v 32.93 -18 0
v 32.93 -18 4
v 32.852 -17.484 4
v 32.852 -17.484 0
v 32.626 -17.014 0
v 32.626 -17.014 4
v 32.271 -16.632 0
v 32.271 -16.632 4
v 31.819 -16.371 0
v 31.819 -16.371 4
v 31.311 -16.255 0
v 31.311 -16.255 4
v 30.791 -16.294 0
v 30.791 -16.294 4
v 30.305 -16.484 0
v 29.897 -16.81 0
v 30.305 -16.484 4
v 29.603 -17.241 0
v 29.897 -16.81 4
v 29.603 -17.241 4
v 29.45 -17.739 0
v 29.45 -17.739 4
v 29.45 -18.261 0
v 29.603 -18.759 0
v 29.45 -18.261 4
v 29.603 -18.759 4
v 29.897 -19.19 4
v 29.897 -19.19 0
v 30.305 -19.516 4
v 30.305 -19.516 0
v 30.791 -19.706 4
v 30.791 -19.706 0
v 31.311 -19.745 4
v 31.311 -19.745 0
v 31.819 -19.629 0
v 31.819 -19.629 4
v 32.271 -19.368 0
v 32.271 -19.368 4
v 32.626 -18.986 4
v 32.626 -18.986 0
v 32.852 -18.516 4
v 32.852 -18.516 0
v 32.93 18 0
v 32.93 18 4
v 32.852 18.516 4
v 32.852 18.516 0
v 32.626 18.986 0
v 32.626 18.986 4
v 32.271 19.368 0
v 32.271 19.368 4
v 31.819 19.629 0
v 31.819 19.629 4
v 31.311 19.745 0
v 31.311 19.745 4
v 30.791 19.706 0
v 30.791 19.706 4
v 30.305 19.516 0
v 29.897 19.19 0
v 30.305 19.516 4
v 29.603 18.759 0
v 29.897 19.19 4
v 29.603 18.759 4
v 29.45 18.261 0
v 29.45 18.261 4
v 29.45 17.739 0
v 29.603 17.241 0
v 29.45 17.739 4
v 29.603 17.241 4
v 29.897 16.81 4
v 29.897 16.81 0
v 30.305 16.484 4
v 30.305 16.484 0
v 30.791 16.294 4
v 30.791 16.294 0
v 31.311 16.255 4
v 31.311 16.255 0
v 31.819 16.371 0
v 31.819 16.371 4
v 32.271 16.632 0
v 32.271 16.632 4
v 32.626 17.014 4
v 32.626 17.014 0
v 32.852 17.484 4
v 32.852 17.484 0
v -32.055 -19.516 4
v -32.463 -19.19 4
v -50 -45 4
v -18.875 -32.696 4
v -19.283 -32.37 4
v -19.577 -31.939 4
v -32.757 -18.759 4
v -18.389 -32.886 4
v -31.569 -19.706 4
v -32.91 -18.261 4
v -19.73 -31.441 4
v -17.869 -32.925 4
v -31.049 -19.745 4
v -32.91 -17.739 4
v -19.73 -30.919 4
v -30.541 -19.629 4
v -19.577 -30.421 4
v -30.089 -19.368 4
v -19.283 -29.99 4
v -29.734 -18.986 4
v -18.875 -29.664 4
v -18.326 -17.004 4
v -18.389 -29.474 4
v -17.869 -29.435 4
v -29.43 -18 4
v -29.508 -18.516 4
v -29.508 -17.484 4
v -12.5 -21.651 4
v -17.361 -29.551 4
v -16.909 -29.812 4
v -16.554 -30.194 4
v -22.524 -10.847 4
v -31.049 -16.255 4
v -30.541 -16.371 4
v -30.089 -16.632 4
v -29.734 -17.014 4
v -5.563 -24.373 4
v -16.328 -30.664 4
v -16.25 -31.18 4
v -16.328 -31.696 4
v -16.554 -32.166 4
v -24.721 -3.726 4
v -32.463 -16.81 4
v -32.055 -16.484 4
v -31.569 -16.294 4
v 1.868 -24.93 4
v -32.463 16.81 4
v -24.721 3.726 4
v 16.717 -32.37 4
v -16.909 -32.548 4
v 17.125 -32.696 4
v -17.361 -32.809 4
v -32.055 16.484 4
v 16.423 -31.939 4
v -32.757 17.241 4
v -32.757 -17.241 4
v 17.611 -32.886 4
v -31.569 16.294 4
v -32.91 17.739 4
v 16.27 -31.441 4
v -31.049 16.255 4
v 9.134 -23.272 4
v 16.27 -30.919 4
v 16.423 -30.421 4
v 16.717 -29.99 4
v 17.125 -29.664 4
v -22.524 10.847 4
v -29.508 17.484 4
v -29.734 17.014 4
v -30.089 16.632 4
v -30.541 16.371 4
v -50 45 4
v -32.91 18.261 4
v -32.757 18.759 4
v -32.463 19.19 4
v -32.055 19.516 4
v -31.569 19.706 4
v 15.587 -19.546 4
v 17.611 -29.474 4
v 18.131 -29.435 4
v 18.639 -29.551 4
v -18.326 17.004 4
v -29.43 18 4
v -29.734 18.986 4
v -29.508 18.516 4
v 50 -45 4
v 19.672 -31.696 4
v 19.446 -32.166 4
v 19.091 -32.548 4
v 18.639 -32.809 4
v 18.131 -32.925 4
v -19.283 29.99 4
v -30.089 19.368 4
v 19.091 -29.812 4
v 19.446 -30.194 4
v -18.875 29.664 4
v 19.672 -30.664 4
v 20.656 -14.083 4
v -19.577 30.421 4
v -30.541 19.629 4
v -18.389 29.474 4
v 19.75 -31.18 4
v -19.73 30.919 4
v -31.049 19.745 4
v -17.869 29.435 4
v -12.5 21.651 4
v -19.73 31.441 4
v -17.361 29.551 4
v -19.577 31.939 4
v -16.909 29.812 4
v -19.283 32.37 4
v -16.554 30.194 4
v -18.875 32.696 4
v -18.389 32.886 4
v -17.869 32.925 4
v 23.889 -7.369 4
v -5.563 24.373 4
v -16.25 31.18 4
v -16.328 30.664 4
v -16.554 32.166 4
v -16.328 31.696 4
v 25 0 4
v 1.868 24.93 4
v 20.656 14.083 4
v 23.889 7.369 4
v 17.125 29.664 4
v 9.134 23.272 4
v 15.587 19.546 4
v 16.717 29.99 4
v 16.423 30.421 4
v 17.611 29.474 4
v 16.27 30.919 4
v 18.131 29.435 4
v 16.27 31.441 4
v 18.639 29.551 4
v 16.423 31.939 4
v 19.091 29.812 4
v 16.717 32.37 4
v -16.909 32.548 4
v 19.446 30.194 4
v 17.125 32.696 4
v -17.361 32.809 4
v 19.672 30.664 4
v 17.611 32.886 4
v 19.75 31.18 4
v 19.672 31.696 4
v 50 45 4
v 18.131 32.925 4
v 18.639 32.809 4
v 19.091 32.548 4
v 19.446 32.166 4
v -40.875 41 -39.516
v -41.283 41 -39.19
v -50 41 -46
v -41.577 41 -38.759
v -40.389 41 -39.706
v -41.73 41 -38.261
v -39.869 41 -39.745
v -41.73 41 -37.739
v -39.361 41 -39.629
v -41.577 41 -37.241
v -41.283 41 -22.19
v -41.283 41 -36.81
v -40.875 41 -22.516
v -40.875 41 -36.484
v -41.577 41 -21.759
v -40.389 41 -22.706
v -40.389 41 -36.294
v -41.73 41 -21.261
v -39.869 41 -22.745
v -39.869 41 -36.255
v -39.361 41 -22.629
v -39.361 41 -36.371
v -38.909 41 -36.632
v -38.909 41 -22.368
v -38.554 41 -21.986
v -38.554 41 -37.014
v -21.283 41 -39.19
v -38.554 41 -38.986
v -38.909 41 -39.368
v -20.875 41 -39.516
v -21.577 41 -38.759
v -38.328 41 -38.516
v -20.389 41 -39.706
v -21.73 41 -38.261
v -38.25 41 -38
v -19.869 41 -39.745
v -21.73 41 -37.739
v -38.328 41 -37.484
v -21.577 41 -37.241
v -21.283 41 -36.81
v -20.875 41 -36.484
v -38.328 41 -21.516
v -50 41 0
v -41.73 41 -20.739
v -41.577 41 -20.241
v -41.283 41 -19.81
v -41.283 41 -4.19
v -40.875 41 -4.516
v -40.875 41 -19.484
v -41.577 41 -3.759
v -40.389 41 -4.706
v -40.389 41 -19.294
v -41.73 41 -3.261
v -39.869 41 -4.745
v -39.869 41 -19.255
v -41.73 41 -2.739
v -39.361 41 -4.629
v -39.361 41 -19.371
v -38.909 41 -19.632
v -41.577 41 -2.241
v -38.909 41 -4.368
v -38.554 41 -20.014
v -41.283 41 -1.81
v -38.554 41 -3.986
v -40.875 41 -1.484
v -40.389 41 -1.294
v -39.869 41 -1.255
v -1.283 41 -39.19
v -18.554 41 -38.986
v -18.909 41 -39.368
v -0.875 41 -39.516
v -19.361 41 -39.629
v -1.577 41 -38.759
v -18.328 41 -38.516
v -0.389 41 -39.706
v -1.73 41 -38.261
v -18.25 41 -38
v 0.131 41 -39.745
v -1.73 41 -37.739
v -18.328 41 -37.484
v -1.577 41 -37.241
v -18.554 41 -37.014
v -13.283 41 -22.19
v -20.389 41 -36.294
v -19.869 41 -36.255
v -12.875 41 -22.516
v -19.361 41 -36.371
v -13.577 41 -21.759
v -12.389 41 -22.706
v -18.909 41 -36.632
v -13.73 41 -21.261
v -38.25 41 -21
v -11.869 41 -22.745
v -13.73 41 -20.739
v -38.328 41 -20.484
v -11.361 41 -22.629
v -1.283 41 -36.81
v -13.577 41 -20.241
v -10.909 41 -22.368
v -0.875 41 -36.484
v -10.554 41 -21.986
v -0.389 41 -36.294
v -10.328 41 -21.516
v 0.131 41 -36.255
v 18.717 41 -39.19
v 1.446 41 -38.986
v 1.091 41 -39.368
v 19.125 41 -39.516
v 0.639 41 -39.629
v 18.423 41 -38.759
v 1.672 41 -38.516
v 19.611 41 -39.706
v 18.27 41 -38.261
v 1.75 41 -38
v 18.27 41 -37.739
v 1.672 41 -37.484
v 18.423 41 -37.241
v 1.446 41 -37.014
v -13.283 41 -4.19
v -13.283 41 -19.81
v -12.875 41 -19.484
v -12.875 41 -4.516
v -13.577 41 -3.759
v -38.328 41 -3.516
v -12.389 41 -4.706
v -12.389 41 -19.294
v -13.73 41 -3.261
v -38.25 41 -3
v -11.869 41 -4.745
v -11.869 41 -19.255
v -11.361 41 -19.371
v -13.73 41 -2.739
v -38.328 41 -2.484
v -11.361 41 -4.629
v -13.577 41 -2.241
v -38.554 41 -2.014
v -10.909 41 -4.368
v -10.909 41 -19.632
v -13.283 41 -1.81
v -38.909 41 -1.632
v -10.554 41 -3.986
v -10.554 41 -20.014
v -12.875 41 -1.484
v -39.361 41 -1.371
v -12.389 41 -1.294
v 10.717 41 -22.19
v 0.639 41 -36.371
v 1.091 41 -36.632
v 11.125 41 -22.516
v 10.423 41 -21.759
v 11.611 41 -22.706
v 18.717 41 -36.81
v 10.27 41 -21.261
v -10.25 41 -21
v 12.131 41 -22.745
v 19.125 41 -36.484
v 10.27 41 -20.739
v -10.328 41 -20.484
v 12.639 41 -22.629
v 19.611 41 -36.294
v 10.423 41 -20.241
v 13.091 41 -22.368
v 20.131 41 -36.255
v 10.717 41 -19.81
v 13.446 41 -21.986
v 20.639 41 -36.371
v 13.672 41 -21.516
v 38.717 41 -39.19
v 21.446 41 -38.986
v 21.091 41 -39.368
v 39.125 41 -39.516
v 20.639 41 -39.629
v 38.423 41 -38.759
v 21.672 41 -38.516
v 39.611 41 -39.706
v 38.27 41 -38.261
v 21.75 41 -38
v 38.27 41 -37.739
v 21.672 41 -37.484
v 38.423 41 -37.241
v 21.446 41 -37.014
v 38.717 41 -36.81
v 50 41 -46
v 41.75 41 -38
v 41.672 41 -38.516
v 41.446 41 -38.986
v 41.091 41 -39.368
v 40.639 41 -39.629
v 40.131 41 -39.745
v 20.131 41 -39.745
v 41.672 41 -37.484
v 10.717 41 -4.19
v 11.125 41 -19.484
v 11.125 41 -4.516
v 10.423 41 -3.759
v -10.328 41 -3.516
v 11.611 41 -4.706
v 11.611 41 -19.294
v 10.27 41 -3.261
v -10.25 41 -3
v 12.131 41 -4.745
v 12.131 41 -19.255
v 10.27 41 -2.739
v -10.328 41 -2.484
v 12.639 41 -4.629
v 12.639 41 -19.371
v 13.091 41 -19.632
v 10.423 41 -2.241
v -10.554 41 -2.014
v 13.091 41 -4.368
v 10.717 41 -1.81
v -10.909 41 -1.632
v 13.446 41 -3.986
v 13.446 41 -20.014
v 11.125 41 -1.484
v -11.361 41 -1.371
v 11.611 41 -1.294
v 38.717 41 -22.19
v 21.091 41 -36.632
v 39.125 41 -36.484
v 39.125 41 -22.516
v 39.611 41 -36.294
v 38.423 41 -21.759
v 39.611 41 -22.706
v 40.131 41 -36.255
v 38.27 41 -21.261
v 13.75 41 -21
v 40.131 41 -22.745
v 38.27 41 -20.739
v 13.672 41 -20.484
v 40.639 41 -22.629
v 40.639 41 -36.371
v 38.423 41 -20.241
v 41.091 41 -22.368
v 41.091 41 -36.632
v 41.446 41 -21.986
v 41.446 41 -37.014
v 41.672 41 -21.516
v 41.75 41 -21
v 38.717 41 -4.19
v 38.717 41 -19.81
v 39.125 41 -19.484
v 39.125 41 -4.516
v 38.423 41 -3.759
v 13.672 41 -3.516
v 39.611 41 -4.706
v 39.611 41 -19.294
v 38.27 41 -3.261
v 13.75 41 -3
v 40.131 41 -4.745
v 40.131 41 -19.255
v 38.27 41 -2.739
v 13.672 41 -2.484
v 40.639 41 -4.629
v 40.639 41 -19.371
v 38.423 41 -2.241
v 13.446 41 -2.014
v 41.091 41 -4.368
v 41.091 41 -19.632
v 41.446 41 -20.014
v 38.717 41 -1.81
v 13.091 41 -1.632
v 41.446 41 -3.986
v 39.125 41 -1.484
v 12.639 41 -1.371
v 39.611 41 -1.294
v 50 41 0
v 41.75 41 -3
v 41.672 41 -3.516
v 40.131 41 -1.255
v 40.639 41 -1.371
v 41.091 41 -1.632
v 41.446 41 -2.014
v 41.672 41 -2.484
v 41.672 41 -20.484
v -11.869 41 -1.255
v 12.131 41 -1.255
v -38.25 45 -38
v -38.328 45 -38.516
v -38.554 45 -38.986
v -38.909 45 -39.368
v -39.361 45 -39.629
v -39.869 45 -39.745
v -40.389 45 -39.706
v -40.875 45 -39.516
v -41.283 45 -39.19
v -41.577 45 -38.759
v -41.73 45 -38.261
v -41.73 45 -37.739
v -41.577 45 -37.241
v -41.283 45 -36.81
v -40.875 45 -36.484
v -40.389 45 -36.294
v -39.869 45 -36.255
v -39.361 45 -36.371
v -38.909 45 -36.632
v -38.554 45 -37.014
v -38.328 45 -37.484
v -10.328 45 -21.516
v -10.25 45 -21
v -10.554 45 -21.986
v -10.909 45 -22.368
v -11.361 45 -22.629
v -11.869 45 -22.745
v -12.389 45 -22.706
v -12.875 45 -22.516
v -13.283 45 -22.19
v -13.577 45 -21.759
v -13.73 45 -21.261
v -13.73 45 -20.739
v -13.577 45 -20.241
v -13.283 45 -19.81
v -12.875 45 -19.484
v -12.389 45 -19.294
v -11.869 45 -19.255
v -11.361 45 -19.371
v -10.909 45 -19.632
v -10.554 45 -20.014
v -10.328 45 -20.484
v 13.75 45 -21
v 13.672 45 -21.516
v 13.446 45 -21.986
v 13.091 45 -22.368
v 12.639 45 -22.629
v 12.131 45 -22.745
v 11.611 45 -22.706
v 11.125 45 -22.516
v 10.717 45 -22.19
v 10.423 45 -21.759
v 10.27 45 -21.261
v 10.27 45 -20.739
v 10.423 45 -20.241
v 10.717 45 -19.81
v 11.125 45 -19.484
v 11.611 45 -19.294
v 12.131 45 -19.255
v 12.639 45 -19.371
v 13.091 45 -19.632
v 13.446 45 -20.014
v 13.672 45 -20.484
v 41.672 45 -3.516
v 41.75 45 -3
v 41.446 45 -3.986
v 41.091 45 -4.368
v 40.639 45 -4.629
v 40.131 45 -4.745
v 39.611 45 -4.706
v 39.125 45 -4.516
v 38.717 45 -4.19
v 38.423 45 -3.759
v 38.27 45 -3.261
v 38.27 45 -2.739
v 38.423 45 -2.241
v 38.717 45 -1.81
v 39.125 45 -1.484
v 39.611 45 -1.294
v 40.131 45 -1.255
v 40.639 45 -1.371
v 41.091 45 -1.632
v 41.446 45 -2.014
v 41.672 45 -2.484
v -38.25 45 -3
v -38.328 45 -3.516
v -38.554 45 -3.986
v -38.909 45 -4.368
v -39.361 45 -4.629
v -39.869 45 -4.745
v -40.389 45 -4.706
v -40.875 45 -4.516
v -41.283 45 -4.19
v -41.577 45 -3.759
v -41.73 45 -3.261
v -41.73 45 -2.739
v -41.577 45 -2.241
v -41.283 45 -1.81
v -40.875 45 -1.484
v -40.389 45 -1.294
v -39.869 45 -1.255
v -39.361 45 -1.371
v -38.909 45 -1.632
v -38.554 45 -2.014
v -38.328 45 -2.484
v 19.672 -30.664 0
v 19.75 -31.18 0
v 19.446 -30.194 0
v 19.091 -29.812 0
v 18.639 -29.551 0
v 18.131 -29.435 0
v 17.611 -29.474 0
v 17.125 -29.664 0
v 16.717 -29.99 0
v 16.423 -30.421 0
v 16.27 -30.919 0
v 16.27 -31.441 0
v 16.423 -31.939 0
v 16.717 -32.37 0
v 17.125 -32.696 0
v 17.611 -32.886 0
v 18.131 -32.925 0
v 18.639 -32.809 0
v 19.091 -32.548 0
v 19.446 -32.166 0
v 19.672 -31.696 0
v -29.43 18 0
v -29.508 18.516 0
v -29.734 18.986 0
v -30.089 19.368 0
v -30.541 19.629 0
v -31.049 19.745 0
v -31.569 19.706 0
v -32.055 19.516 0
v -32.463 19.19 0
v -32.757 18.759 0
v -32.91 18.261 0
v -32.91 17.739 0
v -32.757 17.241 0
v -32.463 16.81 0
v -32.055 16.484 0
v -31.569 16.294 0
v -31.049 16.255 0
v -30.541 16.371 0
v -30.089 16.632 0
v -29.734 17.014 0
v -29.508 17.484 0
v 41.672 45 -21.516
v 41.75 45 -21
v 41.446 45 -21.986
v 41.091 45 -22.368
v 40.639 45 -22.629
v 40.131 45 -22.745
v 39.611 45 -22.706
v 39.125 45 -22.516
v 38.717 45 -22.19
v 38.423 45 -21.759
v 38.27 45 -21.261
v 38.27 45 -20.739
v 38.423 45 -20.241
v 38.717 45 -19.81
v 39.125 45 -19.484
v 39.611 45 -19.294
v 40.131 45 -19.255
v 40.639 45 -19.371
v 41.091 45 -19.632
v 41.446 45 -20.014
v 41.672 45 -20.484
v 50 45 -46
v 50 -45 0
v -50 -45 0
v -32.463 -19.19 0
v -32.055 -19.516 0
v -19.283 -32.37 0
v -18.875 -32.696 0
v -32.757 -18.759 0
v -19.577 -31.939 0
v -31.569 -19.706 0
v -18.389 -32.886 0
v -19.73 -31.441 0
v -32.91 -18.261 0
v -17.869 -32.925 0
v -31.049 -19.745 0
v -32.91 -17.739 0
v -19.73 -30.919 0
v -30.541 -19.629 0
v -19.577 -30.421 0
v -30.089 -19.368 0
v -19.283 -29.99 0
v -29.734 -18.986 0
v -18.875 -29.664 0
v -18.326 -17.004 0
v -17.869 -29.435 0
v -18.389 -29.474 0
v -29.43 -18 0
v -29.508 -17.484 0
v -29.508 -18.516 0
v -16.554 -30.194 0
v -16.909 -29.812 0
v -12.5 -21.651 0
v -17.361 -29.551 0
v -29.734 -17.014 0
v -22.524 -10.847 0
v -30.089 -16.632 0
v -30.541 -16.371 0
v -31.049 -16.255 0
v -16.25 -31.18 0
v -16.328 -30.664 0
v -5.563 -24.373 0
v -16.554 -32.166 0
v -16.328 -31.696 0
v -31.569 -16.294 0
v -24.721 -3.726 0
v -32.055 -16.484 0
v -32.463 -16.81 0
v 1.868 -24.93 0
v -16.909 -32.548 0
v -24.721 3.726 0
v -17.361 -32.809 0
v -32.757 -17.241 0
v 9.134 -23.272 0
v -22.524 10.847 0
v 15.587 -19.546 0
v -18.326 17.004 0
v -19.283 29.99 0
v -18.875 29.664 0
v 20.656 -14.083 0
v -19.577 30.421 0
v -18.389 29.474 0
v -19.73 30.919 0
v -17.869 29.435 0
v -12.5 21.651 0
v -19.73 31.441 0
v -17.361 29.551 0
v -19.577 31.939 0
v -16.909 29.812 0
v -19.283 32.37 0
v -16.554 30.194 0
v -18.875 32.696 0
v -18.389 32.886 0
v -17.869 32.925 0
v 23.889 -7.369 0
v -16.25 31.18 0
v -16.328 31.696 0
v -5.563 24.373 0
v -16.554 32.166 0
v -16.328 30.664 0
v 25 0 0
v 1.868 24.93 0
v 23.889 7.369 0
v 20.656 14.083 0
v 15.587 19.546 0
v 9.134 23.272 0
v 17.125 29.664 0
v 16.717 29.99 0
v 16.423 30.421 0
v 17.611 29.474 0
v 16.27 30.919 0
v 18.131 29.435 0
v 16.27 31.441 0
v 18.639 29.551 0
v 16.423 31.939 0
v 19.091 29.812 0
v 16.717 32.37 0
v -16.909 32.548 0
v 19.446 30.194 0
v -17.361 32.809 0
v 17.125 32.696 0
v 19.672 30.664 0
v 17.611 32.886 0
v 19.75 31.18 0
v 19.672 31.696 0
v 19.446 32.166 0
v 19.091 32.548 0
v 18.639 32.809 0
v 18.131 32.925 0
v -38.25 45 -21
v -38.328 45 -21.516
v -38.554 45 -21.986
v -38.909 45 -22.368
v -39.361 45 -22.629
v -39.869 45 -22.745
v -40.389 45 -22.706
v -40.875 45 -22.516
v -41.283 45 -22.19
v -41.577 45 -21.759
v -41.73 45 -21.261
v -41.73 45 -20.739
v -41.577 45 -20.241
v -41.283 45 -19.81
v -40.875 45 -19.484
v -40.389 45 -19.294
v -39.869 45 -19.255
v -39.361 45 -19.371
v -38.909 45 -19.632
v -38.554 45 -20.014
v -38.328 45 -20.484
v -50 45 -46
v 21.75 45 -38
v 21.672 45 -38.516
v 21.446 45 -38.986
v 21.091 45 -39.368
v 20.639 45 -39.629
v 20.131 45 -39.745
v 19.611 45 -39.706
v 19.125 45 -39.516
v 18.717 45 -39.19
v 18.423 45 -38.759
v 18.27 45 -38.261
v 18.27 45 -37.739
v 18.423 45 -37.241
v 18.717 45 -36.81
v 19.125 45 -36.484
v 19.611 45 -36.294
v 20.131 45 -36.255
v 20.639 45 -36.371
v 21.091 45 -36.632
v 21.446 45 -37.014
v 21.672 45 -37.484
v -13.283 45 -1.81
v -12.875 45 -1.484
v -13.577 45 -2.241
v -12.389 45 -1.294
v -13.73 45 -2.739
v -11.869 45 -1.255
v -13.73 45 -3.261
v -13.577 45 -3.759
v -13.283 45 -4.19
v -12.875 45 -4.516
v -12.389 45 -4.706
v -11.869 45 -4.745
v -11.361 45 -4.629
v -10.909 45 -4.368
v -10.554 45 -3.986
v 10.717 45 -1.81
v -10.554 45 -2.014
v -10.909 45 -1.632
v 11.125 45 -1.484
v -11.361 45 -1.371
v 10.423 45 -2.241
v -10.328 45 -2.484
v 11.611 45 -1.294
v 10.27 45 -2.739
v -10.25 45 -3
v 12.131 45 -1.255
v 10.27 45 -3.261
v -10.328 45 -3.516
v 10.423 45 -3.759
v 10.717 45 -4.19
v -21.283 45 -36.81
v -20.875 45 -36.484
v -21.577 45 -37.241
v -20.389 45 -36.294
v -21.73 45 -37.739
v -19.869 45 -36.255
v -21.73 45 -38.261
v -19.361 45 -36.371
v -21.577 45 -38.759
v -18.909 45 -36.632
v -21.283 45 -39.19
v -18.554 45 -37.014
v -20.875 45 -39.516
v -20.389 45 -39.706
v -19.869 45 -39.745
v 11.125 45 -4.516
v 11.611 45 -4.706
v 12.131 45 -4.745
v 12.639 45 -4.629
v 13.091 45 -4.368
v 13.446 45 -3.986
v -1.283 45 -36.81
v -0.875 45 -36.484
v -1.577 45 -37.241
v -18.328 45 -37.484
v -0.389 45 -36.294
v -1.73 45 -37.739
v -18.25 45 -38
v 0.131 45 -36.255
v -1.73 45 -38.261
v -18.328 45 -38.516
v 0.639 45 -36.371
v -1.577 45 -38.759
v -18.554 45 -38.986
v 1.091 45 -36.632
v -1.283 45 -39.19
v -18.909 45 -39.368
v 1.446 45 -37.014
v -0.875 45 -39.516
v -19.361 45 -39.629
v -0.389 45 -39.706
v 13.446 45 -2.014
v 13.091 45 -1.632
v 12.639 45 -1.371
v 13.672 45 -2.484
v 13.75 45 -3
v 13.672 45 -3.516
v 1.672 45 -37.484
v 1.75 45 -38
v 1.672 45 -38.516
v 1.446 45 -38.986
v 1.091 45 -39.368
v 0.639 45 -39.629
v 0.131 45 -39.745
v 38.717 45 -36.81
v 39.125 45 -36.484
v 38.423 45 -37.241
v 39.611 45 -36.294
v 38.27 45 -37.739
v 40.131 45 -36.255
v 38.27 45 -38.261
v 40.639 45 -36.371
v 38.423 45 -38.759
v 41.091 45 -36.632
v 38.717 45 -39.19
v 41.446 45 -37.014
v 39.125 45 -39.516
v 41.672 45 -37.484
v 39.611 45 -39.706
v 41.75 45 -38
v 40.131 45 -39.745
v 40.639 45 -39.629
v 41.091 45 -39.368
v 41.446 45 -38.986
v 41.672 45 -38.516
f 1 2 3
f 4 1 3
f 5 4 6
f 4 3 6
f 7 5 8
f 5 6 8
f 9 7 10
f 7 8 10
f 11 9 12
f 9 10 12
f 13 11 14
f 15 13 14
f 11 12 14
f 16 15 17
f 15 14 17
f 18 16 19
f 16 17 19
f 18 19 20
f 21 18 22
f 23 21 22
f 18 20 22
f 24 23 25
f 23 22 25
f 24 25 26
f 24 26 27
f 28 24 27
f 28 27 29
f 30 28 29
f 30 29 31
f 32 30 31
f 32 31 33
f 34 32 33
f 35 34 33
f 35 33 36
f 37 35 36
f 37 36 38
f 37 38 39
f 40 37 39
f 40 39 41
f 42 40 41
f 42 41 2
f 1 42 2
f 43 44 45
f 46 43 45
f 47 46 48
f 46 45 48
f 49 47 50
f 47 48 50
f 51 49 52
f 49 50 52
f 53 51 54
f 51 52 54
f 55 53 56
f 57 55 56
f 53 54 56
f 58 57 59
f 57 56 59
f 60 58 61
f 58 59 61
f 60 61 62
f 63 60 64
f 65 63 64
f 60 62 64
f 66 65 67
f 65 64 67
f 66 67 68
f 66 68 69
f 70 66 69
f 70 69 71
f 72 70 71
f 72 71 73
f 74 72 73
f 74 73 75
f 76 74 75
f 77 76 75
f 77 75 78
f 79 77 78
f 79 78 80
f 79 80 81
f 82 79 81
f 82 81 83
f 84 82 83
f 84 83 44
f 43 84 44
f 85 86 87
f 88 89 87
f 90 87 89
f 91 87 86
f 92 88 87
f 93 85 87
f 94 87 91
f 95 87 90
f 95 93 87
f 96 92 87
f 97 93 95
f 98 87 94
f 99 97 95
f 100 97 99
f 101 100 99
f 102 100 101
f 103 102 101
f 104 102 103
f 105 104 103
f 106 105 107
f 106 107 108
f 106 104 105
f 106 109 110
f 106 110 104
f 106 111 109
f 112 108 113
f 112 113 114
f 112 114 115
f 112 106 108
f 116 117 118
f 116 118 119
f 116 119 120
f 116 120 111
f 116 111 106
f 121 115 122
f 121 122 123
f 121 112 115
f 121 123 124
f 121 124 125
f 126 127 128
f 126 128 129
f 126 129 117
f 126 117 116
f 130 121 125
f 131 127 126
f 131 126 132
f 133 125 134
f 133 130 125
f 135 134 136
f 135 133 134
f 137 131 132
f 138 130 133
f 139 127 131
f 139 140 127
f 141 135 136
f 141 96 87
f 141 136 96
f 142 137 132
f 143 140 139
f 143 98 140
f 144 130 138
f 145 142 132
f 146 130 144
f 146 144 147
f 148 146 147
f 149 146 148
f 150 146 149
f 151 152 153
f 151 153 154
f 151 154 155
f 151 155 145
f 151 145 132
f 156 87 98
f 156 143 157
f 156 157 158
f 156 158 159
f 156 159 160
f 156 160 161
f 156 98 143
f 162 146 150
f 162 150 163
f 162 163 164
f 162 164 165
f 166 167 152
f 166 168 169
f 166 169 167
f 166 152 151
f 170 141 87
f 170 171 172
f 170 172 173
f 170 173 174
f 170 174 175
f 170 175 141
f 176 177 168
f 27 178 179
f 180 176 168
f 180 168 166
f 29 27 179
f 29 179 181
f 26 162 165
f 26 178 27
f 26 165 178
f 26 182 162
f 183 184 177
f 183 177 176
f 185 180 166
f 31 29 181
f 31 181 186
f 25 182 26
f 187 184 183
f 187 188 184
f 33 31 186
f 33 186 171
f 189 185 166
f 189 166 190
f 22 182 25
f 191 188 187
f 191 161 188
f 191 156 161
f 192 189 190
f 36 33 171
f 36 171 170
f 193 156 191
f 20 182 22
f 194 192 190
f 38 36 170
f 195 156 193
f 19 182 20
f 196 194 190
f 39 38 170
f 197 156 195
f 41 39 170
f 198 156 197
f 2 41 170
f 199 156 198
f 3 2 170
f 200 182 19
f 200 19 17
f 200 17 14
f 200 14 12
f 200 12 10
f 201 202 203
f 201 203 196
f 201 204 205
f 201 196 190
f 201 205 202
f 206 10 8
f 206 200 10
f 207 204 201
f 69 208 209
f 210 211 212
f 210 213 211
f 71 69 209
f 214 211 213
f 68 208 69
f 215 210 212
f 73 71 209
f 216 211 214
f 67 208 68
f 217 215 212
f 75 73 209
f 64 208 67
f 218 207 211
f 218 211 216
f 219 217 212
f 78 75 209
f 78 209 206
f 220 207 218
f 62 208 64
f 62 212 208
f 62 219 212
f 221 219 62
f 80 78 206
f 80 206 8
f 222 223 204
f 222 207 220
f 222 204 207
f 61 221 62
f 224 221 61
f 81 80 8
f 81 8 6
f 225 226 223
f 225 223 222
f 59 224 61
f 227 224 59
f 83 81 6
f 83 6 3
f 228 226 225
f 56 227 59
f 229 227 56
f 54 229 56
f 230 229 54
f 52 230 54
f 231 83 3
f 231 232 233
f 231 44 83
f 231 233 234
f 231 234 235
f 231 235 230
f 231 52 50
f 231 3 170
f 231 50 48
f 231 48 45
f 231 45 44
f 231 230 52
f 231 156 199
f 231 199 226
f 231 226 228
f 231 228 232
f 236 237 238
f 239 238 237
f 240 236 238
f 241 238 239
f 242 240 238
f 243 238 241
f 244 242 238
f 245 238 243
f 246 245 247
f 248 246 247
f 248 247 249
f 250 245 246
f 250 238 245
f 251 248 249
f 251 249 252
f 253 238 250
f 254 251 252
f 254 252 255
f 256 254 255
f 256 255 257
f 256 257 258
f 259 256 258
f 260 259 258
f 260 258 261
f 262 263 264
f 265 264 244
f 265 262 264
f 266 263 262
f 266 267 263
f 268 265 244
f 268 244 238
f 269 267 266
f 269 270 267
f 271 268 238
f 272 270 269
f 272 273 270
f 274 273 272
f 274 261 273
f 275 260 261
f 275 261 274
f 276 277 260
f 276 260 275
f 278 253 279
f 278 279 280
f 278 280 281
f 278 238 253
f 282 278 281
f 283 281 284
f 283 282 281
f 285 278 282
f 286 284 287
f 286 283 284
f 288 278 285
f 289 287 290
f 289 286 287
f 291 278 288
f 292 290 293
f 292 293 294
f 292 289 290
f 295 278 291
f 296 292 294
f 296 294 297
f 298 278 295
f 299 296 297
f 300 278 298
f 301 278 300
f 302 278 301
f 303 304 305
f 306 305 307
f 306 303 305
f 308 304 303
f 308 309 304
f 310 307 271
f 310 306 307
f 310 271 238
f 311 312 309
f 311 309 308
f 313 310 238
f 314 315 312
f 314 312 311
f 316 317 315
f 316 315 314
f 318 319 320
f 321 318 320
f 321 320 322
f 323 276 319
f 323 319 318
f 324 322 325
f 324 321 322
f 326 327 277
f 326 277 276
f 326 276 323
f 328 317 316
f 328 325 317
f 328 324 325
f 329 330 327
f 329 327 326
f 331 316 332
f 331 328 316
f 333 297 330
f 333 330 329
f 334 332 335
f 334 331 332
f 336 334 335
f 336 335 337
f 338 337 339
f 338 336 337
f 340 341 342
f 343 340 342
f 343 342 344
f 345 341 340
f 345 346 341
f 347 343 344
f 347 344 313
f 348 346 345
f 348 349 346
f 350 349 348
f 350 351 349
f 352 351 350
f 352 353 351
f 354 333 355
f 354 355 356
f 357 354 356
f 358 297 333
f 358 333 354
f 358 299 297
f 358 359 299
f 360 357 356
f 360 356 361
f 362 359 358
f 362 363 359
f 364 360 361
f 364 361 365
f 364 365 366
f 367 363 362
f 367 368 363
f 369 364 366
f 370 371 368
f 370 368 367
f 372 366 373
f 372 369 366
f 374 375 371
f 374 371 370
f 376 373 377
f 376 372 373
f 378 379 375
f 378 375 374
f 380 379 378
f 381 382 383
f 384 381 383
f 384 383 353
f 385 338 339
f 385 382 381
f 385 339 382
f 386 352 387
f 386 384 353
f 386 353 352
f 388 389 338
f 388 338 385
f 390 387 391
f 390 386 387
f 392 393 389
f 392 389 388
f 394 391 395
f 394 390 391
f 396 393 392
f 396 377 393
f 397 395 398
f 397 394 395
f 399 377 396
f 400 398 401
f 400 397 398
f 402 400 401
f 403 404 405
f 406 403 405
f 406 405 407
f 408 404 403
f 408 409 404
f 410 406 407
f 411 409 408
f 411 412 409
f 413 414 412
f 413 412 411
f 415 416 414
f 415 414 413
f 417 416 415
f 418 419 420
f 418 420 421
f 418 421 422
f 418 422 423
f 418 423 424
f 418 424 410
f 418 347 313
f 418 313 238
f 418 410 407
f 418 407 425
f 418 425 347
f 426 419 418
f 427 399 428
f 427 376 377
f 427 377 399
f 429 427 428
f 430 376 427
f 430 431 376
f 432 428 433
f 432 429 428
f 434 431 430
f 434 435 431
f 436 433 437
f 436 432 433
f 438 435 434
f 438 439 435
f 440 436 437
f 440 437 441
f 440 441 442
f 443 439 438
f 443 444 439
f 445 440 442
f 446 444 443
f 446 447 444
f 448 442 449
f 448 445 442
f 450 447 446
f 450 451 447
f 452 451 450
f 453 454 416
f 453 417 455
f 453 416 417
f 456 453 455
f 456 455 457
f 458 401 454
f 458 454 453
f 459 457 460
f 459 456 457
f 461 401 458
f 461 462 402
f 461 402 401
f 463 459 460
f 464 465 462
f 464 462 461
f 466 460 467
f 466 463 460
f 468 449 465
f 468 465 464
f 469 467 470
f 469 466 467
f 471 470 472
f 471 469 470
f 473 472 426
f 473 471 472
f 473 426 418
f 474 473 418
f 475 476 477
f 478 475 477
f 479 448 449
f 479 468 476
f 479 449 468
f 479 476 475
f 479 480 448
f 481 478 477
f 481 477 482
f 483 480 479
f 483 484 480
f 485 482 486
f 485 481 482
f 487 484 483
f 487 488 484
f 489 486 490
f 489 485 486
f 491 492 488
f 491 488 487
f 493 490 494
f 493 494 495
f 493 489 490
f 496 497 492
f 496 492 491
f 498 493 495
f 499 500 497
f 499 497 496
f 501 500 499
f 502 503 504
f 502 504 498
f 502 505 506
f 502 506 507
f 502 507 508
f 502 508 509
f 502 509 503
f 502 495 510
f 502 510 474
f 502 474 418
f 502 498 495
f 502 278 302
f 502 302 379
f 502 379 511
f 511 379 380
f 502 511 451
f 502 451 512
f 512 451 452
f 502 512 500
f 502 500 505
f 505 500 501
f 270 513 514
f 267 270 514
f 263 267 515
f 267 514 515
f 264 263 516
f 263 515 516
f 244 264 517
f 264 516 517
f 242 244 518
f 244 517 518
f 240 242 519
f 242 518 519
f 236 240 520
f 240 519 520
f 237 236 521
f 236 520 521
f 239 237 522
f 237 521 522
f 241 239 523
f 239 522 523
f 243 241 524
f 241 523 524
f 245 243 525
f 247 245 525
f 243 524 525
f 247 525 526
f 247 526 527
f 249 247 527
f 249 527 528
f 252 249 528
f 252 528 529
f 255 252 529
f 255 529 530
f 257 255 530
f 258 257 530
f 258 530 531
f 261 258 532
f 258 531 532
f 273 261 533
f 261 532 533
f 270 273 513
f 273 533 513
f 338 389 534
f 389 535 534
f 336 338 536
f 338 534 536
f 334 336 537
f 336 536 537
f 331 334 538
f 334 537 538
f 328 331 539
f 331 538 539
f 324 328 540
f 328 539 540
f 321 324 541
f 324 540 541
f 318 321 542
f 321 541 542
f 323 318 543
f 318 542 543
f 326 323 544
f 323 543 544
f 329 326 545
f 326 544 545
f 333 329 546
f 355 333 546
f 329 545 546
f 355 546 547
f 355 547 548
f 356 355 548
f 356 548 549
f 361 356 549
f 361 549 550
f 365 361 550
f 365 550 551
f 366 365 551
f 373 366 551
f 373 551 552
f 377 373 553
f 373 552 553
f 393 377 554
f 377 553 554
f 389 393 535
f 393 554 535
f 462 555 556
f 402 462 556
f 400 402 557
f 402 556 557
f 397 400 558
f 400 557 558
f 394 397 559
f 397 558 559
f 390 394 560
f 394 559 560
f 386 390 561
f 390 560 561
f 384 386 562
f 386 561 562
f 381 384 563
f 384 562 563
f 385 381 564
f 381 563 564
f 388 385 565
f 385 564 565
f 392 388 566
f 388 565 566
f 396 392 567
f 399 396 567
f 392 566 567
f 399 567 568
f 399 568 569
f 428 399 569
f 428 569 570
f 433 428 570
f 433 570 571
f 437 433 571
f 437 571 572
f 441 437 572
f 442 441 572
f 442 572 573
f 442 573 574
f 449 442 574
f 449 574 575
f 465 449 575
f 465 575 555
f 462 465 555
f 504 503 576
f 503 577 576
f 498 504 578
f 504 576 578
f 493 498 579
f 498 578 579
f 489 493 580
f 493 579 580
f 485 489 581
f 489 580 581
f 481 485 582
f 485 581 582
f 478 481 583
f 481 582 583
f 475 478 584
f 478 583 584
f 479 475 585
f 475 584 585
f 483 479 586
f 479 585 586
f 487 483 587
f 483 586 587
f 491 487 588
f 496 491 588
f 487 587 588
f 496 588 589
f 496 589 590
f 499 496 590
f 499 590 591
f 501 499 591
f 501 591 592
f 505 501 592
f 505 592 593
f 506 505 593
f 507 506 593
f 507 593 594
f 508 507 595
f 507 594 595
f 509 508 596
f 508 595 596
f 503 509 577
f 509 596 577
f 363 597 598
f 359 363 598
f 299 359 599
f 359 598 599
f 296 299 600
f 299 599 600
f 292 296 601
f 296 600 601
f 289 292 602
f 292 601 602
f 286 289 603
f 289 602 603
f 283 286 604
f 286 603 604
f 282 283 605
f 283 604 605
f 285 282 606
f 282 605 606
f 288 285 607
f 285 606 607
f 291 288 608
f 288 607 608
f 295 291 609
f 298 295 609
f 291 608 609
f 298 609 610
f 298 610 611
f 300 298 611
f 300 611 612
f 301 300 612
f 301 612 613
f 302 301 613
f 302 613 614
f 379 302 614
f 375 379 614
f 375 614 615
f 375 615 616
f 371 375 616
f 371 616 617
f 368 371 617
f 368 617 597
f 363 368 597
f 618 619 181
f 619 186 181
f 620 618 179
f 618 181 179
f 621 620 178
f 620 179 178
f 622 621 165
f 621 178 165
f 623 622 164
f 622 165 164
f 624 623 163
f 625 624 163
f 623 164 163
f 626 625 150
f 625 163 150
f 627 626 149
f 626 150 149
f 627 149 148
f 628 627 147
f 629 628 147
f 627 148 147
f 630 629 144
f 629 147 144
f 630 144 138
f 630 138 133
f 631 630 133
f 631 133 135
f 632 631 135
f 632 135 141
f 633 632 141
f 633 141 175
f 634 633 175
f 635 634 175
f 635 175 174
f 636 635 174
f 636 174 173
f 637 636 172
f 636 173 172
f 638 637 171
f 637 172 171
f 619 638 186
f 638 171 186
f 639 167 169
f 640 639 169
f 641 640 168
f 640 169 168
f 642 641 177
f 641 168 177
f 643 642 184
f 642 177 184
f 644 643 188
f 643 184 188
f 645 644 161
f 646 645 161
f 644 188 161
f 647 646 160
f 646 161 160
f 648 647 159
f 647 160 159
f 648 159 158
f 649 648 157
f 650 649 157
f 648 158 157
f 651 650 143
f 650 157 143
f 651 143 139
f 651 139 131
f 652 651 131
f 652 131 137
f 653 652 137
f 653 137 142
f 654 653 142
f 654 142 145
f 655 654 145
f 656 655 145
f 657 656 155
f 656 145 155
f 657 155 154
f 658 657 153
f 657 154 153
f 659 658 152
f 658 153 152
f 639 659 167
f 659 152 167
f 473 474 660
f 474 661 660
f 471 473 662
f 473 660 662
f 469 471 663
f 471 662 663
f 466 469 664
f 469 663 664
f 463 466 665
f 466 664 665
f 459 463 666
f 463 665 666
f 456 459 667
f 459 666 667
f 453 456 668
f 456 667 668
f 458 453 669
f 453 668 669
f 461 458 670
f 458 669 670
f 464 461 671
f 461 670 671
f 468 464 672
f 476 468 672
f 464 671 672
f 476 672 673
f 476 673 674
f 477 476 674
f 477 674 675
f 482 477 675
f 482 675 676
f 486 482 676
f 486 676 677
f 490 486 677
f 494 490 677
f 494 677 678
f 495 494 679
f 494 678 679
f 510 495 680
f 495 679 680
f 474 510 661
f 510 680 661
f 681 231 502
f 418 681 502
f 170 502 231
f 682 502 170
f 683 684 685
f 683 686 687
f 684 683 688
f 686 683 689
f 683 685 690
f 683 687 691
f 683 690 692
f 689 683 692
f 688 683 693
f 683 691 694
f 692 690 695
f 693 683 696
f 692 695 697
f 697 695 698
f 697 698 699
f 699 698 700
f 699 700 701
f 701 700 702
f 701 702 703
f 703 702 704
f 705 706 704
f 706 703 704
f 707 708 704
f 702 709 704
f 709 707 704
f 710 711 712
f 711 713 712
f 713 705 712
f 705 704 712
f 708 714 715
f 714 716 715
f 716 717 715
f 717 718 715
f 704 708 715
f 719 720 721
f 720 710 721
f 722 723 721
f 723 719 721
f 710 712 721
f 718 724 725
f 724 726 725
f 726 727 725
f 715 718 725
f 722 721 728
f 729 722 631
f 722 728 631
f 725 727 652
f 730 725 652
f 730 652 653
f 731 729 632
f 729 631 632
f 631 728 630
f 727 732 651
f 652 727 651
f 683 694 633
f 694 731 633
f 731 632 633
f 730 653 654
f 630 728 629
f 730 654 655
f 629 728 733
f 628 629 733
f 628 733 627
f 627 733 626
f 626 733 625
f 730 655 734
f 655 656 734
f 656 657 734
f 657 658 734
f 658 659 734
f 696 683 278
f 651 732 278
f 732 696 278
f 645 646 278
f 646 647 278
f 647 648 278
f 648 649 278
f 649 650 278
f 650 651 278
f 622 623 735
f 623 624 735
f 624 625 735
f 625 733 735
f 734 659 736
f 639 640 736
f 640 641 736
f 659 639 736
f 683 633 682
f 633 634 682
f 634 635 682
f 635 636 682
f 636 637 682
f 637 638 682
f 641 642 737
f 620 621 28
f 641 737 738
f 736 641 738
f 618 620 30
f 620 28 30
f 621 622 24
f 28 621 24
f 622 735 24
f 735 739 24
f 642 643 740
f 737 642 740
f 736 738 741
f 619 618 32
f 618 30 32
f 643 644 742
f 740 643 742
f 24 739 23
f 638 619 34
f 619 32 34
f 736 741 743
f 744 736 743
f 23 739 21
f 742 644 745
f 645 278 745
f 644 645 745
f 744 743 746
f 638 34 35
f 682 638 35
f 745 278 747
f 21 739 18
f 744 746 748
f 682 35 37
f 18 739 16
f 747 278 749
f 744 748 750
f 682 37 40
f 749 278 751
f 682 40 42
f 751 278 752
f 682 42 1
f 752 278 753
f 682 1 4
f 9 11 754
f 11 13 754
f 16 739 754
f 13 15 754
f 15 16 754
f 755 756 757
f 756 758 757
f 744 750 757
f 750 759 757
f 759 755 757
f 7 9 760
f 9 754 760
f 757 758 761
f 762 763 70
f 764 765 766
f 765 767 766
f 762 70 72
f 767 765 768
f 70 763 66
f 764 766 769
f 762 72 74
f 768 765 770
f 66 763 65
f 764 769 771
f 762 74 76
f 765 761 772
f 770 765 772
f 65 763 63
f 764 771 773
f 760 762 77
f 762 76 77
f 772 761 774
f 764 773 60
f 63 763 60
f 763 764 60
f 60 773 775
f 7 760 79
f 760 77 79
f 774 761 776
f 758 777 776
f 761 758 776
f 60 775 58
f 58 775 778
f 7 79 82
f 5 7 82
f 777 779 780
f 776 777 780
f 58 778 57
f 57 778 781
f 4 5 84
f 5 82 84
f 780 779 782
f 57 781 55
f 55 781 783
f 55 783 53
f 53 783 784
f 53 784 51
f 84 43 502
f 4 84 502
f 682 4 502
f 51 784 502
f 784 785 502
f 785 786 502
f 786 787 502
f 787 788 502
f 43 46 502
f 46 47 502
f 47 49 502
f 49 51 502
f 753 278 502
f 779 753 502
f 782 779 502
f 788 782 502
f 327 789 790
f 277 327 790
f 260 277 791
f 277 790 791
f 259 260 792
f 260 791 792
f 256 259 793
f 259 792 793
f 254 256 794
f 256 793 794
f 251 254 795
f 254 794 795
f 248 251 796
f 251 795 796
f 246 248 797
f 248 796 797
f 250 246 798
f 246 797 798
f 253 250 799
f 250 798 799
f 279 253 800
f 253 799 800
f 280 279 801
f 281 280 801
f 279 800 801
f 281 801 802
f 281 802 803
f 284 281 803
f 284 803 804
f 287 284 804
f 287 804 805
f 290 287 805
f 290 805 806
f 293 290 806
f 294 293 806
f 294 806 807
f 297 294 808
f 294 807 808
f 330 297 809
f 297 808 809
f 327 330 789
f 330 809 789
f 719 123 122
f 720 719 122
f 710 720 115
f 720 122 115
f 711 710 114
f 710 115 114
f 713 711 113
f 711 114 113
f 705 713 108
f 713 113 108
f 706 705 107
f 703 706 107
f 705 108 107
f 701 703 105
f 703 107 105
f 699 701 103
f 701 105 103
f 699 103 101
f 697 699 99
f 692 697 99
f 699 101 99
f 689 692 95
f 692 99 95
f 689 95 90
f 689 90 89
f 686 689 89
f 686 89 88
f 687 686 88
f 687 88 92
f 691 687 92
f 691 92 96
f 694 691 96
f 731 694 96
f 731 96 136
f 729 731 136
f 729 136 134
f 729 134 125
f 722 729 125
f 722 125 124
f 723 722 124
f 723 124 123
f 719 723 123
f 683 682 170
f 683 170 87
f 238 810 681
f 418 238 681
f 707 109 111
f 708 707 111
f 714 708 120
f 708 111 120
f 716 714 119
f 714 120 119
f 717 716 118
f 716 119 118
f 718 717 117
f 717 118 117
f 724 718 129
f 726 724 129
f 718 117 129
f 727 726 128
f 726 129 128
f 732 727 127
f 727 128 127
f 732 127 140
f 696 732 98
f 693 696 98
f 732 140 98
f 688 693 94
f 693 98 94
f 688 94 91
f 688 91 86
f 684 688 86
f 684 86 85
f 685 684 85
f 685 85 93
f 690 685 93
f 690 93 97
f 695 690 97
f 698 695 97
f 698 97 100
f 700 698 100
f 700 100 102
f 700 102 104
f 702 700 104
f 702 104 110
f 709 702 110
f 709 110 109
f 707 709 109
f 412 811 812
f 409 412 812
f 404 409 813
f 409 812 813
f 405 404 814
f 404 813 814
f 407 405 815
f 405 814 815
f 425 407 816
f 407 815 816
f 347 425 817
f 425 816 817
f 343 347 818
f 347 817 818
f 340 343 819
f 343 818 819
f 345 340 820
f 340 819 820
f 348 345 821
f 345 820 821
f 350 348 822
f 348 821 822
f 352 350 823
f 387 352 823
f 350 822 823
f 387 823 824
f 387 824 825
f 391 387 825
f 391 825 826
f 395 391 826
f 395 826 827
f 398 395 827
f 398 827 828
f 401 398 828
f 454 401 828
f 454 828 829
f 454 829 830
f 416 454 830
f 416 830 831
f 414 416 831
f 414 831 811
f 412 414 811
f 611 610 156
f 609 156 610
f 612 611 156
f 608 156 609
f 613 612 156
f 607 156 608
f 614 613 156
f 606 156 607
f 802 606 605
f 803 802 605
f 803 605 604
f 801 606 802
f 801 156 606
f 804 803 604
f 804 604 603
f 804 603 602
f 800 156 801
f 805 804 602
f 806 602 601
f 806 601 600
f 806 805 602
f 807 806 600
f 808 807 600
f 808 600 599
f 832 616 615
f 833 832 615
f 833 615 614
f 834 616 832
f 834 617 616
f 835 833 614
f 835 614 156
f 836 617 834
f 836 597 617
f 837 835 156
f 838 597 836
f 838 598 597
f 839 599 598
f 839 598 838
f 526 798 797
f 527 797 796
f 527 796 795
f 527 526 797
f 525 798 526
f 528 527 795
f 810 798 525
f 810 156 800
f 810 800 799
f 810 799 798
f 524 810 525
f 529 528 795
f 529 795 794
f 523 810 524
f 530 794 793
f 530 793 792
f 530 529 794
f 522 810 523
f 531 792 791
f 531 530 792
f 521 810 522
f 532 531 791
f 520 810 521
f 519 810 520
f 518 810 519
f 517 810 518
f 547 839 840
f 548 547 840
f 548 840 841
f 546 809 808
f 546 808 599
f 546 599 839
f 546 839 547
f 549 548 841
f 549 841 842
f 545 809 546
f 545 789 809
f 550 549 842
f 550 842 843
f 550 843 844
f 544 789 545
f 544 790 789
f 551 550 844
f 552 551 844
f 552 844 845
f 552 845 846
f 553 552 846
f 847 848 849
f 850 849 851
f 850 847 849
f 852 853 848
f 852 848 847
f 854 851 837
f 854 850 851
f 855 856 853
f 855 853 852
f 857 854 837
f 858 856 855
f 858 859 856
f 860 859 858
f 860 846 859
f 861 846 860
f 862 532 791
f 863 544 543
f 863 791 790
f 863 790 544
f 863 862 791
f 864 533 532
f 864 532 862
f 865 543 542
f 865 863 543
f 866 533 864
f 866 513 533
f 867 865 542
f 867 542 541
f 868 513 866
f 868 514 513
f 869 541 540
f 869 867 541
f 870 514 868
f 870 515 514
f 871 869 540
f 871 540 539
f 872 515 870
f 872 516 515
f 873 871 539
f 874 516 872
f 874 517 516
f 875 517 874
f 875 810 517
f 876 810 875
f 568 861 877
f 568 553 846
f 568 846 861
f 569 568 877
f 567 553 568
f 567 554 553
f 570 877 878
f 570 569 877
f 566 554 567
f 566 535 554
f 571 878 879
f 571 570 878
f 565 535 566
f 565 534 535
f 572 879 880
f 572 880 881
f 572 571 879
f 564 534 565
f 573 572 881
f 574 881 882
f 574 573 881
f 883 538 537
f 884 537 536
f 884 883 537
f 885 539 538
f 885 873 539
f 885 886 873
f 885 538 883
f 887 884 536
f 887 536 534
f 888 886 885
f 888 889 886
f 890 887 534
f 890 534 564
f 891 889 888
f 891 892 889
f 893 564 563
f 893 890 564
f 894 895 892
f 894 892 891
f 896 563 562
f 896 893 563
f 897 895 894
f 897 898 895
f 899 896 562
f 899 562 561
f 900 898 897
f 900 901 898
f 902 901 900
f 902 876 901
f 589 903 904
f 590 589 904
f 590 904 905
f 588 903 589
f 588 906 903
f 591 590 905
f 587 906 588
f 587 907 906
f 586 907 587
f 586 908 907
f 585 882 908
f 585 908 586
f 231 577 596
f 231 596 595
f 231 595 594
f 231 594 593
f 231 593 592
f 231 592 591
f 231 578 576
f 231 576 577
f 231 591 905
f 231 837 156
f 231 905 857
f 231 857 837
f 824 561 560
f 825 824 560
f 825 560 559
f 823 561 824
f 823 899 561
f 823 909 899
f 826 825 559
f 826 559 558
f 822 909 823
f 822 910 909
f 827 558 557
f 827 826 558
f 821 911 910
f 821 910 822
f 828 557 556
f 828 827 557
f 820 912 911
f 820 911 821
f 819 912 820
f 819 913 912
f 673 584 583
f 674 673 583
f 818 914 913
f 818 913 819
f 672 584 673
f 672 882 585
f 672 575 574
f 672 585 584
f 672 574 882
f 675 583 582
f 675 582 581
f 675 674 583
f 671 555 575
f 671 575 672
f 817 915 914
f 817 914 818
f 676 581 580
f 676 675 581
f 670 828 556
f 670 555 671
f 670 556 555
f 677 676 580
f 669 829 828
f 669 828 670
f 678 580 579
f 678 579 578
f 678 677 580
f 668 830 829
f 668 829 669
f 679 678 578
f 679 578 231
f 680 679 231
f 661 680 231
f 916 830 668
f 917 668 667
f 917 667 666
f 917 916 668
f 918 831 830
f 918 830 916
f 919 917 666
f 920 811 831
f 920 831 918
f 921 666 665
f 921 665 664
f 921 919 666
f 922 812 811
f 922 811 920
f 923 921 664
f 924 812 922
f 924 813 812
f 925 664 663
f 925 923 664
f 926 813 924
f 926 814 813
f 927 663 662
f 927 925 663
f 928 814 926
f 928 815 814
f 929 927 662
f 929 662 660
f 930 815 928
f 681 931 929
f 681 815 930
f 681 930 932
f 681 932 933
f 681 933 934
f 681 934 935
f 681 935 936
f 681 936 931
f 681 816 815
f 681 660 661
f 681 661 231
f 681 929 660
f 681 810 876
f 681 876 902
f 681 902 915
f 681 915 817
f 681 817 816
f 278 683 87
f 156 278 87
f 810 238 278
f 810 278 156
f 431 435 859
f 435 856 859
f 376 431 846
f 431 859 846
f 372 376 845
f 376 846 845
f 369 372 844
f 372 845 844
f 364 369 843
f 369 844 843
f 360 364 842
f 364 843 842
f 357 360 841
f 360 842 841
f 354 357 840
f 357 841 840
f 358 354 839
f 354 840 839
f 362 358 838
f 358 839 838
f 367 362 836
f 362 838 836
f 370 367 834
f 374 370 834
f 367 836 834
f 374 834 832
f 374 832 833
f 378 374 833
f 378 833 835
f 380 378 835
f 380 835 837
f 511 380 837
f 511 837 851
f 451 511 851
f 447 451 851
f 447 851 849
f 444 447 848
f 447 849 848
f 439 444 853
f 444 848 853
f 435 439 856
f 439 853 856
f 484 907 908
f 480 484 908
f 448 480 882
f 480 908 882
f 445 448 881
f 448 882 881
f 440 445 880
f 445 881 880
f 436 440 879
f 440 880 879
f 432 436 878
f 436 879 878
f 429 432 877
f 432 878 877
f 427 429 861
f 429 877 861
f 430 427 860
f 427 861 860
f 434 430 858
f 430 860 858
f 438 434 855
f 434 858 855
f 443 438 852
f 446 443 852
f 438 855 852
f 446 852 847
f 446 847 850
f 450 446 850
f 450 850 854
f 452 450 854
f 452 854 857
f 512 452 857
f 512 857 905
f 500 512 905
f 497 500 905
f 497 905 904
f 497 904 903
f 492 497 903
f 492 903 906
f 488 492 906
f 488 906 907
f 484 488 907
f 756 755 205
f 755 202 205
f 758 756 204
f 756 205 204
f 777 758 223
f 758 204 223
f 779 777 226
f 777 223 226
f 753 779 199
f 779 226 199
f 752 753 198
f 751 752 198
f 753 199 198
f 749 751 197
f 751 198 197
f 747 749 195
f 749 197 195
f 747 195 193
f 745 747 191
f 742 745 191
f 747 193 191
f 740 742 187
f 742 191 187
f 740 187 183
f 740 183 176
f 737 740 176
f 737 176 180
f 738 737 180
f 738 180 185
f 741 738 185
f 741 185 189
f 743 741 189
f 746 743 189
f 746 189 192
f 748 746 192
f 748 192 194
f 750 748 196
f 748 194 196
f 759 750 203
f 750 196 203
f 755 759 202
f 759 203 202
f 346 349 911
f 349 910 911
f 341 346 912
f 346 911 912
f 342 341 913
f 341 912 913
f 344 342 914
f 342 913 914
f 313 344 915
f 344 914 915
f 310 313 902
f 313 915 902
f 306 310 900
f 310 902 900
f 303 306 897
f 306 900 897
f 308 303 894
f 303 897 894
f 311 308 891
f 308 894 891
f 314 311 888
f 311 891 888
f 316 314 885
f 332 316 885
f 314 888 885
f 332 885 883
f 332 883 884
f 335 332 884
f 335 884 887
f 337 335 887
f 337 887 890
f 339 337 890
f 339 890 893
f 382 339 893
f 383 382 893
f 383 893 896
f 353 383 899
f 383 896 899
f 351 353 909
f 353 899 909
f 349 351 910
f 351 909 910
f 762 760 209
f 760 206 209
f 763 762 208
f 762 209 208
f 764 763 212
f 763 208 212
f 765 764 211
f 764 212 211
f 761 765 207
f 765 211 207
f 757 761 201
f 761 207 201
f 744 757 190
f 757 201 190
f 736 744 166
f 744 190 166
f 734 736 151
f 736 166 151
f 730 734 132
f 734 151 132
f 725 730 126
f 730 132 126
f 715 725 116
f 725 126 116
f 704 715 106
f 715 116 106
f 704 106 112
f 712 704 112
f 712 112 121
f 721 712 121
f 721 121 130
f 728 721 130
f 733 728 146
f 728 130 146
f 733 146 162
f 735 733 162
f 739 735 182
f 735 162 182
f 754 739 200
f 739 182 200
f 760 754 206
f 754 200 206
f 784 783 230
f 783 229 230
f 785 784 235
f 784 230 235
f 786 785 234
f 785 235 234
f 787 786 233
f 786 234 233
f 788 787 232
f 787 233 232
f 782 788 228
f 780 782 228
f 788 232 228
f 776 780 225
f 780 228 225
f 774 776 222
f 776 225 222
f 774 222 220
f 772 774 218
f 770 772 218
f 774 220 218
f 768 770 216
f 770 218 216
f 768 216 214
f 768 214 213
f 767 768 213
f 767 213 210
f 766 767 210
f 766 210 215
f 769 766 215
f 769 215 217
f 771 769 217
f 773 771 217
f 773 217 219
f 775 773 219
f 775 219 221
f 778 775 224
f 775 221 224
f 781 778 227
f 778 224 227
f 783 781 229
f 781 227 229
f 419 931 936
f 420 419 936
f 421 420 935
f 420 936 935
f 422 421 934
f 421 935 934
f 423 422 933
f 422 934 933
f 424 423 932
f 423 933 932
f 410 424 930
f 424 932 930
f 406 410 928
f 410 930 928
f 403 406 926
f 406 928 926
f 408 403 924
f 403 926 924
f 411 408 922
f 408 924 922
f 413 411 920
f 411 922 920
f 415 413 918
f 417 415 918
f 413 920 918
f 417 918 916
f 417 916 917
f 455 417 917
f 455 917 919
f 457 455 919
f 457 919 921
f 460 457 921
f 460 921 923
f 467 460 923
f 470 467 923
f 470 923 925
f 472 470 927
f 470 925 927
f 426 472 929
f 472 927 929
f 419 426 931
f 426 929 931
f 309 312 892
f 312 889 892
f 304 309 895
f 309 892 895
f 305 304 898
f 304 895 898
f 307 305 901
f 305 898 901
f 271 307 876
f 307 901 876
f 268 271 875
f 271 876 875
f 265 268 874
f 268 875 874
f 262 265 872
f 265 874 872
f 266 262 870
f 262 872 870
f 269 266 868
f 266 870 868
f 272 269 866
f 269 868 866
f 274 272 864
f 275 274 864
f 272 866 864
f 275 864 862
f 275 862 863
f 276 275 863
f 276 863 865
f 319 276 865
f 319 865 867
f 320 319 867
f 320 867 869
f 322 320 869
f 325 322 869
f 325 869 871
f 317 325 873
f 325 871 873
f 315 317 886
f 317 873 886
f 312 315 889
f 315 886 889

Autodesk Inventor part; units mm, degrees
ref_plane "YZ Plane" through (0, 0, 0) normal (1, 0, 0) x (0, 1, 0)
ref_plane "XZ Plane" through (0, 0, 0) normal (0, 1, 0) x (-1, 0, 0)
ref_plane "XY Plane" through (0, 0, 0) normal (0, 0, 1) x (1, 0, 0)
sketch "Sketch3" plane through (0, 0, 0) normal (0, 0, 1) x (1, 0, 0)
  line L0 (-50, 45) -> (50, 45)
  line L1 (50, 45) -> (50, -45)
  line L2 (50, -45) -> (-50, -45)
  line L3 (-50, -45) -> (-50, 45)
  line L4 (-50, 45) -> (50, -45) construction
  line L5 (50, 45) -> (-50, -45) construction
  point P0 (0, 0)
  dimension "d4" = 100
  dimension "d5" = 90
extrude "Extrusion2" add sketch "Sketch3" along normal blind 4
sketch "Sketch4" plane through (0, 0, 4) normal (0, 0, 1) x (1, 0, 0)
  point P0 (0, 0)
sketch "Sketch5" plane through (0, 0, 4) normal (0, 0, 1) x (1, 0, 0)
  line L0 (50, 45) -> (-50, 45) projected
  line L1 (50, 45) -> (-50, 45)
  line L2 (-50, 45) -> (-50, 41)
  line L3 (-50, 41) -> (50, 41)
  line L4 (50, 41) -> (50, 45)
  point P0 (0, 0)
  dimension "d8" = 4
  dimension "d9" = 100
extrude "Extrusion3" add sketch "Sketch5" against normal blind 50
sketch "Sketch6" plane through (0, 0, 4) normal (0, 0, 1) x (1, 0, 0)
  line L0 (18, -31.18) -> (-18, -31.18)
  line L1 (-18, -31.18) -> (-18, 31.18)
  line L2 (-18, 31.18) -> (18, 31.18)
  line L3 (18, 31.18) -> (18, -31.18)
  line L4 (18, -31.18) -> (-18, 31.18) construction
  line L5 (-18, -31.18) -> (18, 31.18) construction
  circle A0 centre (-18, 31.18) radius 1.75
  circle A1 centre (18, 31.18) radius 1.75
  circle A2 centre (-18, -31.18) radius 1.75
  circle A3 centre (18, -31.18) radius 1.75
  point P0 (0, 0)
  dimension "d12" = 36
  dimension "d13" = 62.36
  dimension "d14" = 3.5
  dimension "d15" = 3.5
  dimension "d16" = 3.5
  dimension "d17" = 3.5
extrude "Extrusion4" cut sketch "Sketch6" against normal blind 50 contours A2 L1 L0 | L0 L1 A2 | A3 L3 L0 | L0 L3 A3 | A0 L2 L1 | L1 L2 A0 | A1 L2 L3 | L3 L2 A1
sketch "Sketch7" plane through (0, 0, 4) normal (0, 0, 1) x (1, 0, 0)
  line L0 (31.18, -18) -> (-31.18, -18)
  line L1 (-31.18, -18) -> (-31.18, 18)
  line L2 (-31.18, 18) -> (31.18, 18)
  line L3 (31.18, 18) -> (31.18, -18)
  line L4 (31.18, -18) -> (-31.18, 18) construction
  line L5 (-31.18, -18) -> (31.18, 18) construction
  circle A0 centre (-31.18, 18) radius 1.75
  circle A1 centre (31.18, 18) radius 1.75
  circle A2 centre (-31.18, -18) radius 1.75
  circle A3 centre (31.18, -18) radius 1.75
  point P0 (0, 0)
  dimension "d20" = 62.36
  dimension "d21" = 36
  dimension "d22" = 3.5
  dimension "d23" = 3.5
  dimension "d24" = 3.5
  dimension "d25" = 3.5
extrude "Extrusion5" cut sketch "Sketch7" against normal blind 50 contours A2 L1 L0 | L0 L1 A2 | A3 L3 L0 | L0 L3 A3 | A0 L2 L1 | L1 L2 A0 | A1 L2 L3 | L3 L2 A1
sketch "Sketch8" plane through (0, 0, 4) normal (0, 0, 1) x (1, 0, 0)
  circle A0 centre (0, 0) radius 25
  dimension "d28" = 50
extrude "Extrusion6" cut sketch "Sketch8" against normal blind 43.6625
sketch "Sketch9" plane through (-50, 45, 4) normal (0, 1, 0) x (1, 0, 0)
  line L0 (0, 50) -> (0, 0) projected
  line L1 (100, 0) -> (0, 0) projected
  line L2 (0, 0) -> (38, 0)
  line L3 (38, 0) -> (38, 7)
  line L4 (38, 7) -> (0, 7)
  line L5 (0, 7) -> (0, 0)
  circle A0 centre (38, 7) radius 1.75
  line L6 (0, 0) -> (38, 0)
  line L7 (38, 0) -> (38, 25)
  line L8 (38, 25) -> (0, 25)
  line L9 (0, 25) -> (0, 0)
  circle A1 centre (38, 25) radius 1.75
  point P0 (50, 4)
  dimension "d31" = 38
  dimension "d32" = 7
  dimension "d36" = 3.5
  dimension "d39" = 25
  dimension "d40" = 3.5
sketch "Sketch10" plane through (-50, 45, 4) normal (0, 1, 0) x (1, 0, 0)
  line L0 (100, 4) -> (100, 0) projected
  line L1 (100, 0) -> (0, 0) projected
  line L2 (100, 0) -> (62, 0)
  line L3 (62, 0) -> (62, 7)
  line L4 (62, 7) -> (100, 7)
  line L5 (100, 7) -> (100, 0)
  circle A0 centre (62, 7) radius 1.75
  line L6 (100, 0) -> (62, 0)
  line L7 (62, 0) -> (62, 25)
  line L8 (62, 25) -> (100, 25)
  line L9 (100, 25) -> (100, 0)
  line L10 (75, 0) -> (25, 0) projected
  circle A1 centre (62, 25) radius 1.75
  point P0 (50, 4)
  dimension "d33" = 38
  dimension "d34" = 7
  dimension "d35" = 3.5
  dimension "d37" = 25
  dimension "d38" = 3.5
sketch "Sketch11" plane through (-50, 45, 4) normal (0, 1, 0) x (1, 0, 0)
  point P0 (50, 4)
extrude "Extrusion7" cut sketch "Sketch9" against normal blind 43.6625 contours A1 L7 L8 | L8 L7 A1 | A0 L7 L4 | L4 L3 A0 | L7 A0 L3
extrude "Extrusion8" cut sketch "Sketch10" against normal blind 43.6625 contours A0 L3 L4 | L4 L7 A0 | L3 A0 L7 | A1 L7 L8 | L8 L7 A1
sketch "Sketch12" plane through (-50, 45, 4) normal (0, 1, 0) x (1, 0, 0)
  line L0 (0, 0) -> (100, 0) projected
  line L1 (0, 0) -> (10, 0)
  line L2 (10, 0) -> (10, 7)
  line L3 (10, 7) -> (0, 7)
  line L4 (0, 7) -> (0, 0)
  line L5 (100, 0) -> (0, 0) projected
  line L6 (0, 0) -> (10, 0)
  line L7 (10, 0) -> (10, 25)
  line L8 (10, 25) -> (0, 25)
  line L9 (0, 25) -> (0, 0)
  circle A0 centre (10, 7) radius 1.75
  circle A1 centre (10, 25) radius 1.75
  point P0 (50, 4)
  dimension "d45" = 10
  dimension "d46" = 7
  dimension "d47" = 25
  dimension "d48" = 3.5
  dimension "d49" = 3.5
extrude "Extrusion9" cut sketch "Sketch12" against normal blind 43.6625 contours A0 L3 L2 | L2 L7 A0 | A0 L7 L3 | A1 L7 L8 | L8 L7 A1
sketch "Sketch13" plane through (-50, 45, 4) normal (0, 1, 0) x (1, 0, 0)
  line L0 (0, 0) -> (100, 0) projected
  line L1 (100, 0) -> (90, 0)
  line L2 (90, 0) -> (90, 7)
  line L3 (90, 7) -> (100, 7)
  line L4 (100, 7) -> (100, 0)
  line L5 (100, 0) -> (90, 0)
  line L6 (90, 0) -> (90, 25)
  line L7 (90, 25) -> (100, 25)
  line L8 (100, 25) -> (100, 0)
  circle A0 centre (90, 25) radius 1.75
  circle A1 centre (90, 7) radius 1.75
  point P0 (50, 4)
  dimension "d52" = 10
  dimension "d53" = 7
  dimension "d54" = 25
  dimension "d55" = 3.5
  dimension "d56" = 3.5
extrude "Extrusion10" cut sketch "Sketch13" against normal blind 43.6625 contours A1 L6 L2 | L2 L3 A1 | L6 A1 L3 | A0 L7 L6 | L6 L7 A0
sketch "Sketch14" plane through (-50, 45, 4) normal (0, 1, 0) x (1, 0, 0)
  point P0 (50, 4)
sketch "Sketch15" plane through (-50, 45, 4) normal (0, 1, 0) x (1, 0, 0)
  line L0 (0, 50) -> (100, 50) projected
  line L1 (0, 50) -> (50, 50)
  line L2 (50, 50) -> (50, 42)
  line L3 (50, 42) -> (0, 42)
  line L4 (0, 42) -> (0, 50)
  line L5 (0, 50) -> (10, 50)
  line L6 (10, 50) -> (10, 42)
  line L7 (10, 42) -> (0, 42)
  line L8 (0, 42) -> (0, 50)
  line L9 (0, 4) -> (0, 50) projected
  line L10 (0, 50) -> (30, 50)
  line L11 (30, 50) -> (30, 42)
  line L12 (30, 42) -> (0, 42)
  line L13 (0, 42) -> (0, 50)
  line L14 (100, 4) -> (100, 50) projected
  line L15 (100, 50) -> (90, 50)
  line L16 (90, 50) -> (90, 42)
  line L17 (90, 42) -> (100, 42)
  line L18 (100, 42) -> (100, 50)
  line L19 (100, 50) -> (0, 50) projected
  line L20 (100, 50) -> (70, 50)
  line L21 (70, 50) -> (70, 42)
  line L22 (70, 42) -> (100, 42)
  line L23 (100, 42) -> (100, 50)
  circle A0 centre (50, 42) radius 1.75
  circle A1 centre (30, 42) radius 1.75
  circle A2 centre (10, 42) radius 1.75
  circle A3 centre (70, 42) radius 1.75
  circle A4 centre (90, 42) radius 1.75
  point P0 (50, 4)
  dimension "d59" = 50
  dimension "d60" = 8
  dimension "d61" = 10
  dimension "d62" = 30
  dimension "d63" = 10
  dimension "d64" = 30
  dimension "d65" = 3.5
  dimension "d66" = 3.5
  dimension "d67" = 3.5
  dimension "d68" = 3.5
  dimension "d69" = 3.5
extrude "Extrusion11" cut sketch "Sketch15" against normal blind 43.6625 contours A2 L3 L6 | L6 L3 A2 | L3 A2 | A1 L3 L11 | L11 L3 A1 | A0 L3 L2 | L2 L3 A0 | L3 A1 | A3 L22 L21 | L21 L22 A3 | A4 L17 L16 | L16 L22 A4 | L17 A4 L22
properties part number "ousterholderm600"
